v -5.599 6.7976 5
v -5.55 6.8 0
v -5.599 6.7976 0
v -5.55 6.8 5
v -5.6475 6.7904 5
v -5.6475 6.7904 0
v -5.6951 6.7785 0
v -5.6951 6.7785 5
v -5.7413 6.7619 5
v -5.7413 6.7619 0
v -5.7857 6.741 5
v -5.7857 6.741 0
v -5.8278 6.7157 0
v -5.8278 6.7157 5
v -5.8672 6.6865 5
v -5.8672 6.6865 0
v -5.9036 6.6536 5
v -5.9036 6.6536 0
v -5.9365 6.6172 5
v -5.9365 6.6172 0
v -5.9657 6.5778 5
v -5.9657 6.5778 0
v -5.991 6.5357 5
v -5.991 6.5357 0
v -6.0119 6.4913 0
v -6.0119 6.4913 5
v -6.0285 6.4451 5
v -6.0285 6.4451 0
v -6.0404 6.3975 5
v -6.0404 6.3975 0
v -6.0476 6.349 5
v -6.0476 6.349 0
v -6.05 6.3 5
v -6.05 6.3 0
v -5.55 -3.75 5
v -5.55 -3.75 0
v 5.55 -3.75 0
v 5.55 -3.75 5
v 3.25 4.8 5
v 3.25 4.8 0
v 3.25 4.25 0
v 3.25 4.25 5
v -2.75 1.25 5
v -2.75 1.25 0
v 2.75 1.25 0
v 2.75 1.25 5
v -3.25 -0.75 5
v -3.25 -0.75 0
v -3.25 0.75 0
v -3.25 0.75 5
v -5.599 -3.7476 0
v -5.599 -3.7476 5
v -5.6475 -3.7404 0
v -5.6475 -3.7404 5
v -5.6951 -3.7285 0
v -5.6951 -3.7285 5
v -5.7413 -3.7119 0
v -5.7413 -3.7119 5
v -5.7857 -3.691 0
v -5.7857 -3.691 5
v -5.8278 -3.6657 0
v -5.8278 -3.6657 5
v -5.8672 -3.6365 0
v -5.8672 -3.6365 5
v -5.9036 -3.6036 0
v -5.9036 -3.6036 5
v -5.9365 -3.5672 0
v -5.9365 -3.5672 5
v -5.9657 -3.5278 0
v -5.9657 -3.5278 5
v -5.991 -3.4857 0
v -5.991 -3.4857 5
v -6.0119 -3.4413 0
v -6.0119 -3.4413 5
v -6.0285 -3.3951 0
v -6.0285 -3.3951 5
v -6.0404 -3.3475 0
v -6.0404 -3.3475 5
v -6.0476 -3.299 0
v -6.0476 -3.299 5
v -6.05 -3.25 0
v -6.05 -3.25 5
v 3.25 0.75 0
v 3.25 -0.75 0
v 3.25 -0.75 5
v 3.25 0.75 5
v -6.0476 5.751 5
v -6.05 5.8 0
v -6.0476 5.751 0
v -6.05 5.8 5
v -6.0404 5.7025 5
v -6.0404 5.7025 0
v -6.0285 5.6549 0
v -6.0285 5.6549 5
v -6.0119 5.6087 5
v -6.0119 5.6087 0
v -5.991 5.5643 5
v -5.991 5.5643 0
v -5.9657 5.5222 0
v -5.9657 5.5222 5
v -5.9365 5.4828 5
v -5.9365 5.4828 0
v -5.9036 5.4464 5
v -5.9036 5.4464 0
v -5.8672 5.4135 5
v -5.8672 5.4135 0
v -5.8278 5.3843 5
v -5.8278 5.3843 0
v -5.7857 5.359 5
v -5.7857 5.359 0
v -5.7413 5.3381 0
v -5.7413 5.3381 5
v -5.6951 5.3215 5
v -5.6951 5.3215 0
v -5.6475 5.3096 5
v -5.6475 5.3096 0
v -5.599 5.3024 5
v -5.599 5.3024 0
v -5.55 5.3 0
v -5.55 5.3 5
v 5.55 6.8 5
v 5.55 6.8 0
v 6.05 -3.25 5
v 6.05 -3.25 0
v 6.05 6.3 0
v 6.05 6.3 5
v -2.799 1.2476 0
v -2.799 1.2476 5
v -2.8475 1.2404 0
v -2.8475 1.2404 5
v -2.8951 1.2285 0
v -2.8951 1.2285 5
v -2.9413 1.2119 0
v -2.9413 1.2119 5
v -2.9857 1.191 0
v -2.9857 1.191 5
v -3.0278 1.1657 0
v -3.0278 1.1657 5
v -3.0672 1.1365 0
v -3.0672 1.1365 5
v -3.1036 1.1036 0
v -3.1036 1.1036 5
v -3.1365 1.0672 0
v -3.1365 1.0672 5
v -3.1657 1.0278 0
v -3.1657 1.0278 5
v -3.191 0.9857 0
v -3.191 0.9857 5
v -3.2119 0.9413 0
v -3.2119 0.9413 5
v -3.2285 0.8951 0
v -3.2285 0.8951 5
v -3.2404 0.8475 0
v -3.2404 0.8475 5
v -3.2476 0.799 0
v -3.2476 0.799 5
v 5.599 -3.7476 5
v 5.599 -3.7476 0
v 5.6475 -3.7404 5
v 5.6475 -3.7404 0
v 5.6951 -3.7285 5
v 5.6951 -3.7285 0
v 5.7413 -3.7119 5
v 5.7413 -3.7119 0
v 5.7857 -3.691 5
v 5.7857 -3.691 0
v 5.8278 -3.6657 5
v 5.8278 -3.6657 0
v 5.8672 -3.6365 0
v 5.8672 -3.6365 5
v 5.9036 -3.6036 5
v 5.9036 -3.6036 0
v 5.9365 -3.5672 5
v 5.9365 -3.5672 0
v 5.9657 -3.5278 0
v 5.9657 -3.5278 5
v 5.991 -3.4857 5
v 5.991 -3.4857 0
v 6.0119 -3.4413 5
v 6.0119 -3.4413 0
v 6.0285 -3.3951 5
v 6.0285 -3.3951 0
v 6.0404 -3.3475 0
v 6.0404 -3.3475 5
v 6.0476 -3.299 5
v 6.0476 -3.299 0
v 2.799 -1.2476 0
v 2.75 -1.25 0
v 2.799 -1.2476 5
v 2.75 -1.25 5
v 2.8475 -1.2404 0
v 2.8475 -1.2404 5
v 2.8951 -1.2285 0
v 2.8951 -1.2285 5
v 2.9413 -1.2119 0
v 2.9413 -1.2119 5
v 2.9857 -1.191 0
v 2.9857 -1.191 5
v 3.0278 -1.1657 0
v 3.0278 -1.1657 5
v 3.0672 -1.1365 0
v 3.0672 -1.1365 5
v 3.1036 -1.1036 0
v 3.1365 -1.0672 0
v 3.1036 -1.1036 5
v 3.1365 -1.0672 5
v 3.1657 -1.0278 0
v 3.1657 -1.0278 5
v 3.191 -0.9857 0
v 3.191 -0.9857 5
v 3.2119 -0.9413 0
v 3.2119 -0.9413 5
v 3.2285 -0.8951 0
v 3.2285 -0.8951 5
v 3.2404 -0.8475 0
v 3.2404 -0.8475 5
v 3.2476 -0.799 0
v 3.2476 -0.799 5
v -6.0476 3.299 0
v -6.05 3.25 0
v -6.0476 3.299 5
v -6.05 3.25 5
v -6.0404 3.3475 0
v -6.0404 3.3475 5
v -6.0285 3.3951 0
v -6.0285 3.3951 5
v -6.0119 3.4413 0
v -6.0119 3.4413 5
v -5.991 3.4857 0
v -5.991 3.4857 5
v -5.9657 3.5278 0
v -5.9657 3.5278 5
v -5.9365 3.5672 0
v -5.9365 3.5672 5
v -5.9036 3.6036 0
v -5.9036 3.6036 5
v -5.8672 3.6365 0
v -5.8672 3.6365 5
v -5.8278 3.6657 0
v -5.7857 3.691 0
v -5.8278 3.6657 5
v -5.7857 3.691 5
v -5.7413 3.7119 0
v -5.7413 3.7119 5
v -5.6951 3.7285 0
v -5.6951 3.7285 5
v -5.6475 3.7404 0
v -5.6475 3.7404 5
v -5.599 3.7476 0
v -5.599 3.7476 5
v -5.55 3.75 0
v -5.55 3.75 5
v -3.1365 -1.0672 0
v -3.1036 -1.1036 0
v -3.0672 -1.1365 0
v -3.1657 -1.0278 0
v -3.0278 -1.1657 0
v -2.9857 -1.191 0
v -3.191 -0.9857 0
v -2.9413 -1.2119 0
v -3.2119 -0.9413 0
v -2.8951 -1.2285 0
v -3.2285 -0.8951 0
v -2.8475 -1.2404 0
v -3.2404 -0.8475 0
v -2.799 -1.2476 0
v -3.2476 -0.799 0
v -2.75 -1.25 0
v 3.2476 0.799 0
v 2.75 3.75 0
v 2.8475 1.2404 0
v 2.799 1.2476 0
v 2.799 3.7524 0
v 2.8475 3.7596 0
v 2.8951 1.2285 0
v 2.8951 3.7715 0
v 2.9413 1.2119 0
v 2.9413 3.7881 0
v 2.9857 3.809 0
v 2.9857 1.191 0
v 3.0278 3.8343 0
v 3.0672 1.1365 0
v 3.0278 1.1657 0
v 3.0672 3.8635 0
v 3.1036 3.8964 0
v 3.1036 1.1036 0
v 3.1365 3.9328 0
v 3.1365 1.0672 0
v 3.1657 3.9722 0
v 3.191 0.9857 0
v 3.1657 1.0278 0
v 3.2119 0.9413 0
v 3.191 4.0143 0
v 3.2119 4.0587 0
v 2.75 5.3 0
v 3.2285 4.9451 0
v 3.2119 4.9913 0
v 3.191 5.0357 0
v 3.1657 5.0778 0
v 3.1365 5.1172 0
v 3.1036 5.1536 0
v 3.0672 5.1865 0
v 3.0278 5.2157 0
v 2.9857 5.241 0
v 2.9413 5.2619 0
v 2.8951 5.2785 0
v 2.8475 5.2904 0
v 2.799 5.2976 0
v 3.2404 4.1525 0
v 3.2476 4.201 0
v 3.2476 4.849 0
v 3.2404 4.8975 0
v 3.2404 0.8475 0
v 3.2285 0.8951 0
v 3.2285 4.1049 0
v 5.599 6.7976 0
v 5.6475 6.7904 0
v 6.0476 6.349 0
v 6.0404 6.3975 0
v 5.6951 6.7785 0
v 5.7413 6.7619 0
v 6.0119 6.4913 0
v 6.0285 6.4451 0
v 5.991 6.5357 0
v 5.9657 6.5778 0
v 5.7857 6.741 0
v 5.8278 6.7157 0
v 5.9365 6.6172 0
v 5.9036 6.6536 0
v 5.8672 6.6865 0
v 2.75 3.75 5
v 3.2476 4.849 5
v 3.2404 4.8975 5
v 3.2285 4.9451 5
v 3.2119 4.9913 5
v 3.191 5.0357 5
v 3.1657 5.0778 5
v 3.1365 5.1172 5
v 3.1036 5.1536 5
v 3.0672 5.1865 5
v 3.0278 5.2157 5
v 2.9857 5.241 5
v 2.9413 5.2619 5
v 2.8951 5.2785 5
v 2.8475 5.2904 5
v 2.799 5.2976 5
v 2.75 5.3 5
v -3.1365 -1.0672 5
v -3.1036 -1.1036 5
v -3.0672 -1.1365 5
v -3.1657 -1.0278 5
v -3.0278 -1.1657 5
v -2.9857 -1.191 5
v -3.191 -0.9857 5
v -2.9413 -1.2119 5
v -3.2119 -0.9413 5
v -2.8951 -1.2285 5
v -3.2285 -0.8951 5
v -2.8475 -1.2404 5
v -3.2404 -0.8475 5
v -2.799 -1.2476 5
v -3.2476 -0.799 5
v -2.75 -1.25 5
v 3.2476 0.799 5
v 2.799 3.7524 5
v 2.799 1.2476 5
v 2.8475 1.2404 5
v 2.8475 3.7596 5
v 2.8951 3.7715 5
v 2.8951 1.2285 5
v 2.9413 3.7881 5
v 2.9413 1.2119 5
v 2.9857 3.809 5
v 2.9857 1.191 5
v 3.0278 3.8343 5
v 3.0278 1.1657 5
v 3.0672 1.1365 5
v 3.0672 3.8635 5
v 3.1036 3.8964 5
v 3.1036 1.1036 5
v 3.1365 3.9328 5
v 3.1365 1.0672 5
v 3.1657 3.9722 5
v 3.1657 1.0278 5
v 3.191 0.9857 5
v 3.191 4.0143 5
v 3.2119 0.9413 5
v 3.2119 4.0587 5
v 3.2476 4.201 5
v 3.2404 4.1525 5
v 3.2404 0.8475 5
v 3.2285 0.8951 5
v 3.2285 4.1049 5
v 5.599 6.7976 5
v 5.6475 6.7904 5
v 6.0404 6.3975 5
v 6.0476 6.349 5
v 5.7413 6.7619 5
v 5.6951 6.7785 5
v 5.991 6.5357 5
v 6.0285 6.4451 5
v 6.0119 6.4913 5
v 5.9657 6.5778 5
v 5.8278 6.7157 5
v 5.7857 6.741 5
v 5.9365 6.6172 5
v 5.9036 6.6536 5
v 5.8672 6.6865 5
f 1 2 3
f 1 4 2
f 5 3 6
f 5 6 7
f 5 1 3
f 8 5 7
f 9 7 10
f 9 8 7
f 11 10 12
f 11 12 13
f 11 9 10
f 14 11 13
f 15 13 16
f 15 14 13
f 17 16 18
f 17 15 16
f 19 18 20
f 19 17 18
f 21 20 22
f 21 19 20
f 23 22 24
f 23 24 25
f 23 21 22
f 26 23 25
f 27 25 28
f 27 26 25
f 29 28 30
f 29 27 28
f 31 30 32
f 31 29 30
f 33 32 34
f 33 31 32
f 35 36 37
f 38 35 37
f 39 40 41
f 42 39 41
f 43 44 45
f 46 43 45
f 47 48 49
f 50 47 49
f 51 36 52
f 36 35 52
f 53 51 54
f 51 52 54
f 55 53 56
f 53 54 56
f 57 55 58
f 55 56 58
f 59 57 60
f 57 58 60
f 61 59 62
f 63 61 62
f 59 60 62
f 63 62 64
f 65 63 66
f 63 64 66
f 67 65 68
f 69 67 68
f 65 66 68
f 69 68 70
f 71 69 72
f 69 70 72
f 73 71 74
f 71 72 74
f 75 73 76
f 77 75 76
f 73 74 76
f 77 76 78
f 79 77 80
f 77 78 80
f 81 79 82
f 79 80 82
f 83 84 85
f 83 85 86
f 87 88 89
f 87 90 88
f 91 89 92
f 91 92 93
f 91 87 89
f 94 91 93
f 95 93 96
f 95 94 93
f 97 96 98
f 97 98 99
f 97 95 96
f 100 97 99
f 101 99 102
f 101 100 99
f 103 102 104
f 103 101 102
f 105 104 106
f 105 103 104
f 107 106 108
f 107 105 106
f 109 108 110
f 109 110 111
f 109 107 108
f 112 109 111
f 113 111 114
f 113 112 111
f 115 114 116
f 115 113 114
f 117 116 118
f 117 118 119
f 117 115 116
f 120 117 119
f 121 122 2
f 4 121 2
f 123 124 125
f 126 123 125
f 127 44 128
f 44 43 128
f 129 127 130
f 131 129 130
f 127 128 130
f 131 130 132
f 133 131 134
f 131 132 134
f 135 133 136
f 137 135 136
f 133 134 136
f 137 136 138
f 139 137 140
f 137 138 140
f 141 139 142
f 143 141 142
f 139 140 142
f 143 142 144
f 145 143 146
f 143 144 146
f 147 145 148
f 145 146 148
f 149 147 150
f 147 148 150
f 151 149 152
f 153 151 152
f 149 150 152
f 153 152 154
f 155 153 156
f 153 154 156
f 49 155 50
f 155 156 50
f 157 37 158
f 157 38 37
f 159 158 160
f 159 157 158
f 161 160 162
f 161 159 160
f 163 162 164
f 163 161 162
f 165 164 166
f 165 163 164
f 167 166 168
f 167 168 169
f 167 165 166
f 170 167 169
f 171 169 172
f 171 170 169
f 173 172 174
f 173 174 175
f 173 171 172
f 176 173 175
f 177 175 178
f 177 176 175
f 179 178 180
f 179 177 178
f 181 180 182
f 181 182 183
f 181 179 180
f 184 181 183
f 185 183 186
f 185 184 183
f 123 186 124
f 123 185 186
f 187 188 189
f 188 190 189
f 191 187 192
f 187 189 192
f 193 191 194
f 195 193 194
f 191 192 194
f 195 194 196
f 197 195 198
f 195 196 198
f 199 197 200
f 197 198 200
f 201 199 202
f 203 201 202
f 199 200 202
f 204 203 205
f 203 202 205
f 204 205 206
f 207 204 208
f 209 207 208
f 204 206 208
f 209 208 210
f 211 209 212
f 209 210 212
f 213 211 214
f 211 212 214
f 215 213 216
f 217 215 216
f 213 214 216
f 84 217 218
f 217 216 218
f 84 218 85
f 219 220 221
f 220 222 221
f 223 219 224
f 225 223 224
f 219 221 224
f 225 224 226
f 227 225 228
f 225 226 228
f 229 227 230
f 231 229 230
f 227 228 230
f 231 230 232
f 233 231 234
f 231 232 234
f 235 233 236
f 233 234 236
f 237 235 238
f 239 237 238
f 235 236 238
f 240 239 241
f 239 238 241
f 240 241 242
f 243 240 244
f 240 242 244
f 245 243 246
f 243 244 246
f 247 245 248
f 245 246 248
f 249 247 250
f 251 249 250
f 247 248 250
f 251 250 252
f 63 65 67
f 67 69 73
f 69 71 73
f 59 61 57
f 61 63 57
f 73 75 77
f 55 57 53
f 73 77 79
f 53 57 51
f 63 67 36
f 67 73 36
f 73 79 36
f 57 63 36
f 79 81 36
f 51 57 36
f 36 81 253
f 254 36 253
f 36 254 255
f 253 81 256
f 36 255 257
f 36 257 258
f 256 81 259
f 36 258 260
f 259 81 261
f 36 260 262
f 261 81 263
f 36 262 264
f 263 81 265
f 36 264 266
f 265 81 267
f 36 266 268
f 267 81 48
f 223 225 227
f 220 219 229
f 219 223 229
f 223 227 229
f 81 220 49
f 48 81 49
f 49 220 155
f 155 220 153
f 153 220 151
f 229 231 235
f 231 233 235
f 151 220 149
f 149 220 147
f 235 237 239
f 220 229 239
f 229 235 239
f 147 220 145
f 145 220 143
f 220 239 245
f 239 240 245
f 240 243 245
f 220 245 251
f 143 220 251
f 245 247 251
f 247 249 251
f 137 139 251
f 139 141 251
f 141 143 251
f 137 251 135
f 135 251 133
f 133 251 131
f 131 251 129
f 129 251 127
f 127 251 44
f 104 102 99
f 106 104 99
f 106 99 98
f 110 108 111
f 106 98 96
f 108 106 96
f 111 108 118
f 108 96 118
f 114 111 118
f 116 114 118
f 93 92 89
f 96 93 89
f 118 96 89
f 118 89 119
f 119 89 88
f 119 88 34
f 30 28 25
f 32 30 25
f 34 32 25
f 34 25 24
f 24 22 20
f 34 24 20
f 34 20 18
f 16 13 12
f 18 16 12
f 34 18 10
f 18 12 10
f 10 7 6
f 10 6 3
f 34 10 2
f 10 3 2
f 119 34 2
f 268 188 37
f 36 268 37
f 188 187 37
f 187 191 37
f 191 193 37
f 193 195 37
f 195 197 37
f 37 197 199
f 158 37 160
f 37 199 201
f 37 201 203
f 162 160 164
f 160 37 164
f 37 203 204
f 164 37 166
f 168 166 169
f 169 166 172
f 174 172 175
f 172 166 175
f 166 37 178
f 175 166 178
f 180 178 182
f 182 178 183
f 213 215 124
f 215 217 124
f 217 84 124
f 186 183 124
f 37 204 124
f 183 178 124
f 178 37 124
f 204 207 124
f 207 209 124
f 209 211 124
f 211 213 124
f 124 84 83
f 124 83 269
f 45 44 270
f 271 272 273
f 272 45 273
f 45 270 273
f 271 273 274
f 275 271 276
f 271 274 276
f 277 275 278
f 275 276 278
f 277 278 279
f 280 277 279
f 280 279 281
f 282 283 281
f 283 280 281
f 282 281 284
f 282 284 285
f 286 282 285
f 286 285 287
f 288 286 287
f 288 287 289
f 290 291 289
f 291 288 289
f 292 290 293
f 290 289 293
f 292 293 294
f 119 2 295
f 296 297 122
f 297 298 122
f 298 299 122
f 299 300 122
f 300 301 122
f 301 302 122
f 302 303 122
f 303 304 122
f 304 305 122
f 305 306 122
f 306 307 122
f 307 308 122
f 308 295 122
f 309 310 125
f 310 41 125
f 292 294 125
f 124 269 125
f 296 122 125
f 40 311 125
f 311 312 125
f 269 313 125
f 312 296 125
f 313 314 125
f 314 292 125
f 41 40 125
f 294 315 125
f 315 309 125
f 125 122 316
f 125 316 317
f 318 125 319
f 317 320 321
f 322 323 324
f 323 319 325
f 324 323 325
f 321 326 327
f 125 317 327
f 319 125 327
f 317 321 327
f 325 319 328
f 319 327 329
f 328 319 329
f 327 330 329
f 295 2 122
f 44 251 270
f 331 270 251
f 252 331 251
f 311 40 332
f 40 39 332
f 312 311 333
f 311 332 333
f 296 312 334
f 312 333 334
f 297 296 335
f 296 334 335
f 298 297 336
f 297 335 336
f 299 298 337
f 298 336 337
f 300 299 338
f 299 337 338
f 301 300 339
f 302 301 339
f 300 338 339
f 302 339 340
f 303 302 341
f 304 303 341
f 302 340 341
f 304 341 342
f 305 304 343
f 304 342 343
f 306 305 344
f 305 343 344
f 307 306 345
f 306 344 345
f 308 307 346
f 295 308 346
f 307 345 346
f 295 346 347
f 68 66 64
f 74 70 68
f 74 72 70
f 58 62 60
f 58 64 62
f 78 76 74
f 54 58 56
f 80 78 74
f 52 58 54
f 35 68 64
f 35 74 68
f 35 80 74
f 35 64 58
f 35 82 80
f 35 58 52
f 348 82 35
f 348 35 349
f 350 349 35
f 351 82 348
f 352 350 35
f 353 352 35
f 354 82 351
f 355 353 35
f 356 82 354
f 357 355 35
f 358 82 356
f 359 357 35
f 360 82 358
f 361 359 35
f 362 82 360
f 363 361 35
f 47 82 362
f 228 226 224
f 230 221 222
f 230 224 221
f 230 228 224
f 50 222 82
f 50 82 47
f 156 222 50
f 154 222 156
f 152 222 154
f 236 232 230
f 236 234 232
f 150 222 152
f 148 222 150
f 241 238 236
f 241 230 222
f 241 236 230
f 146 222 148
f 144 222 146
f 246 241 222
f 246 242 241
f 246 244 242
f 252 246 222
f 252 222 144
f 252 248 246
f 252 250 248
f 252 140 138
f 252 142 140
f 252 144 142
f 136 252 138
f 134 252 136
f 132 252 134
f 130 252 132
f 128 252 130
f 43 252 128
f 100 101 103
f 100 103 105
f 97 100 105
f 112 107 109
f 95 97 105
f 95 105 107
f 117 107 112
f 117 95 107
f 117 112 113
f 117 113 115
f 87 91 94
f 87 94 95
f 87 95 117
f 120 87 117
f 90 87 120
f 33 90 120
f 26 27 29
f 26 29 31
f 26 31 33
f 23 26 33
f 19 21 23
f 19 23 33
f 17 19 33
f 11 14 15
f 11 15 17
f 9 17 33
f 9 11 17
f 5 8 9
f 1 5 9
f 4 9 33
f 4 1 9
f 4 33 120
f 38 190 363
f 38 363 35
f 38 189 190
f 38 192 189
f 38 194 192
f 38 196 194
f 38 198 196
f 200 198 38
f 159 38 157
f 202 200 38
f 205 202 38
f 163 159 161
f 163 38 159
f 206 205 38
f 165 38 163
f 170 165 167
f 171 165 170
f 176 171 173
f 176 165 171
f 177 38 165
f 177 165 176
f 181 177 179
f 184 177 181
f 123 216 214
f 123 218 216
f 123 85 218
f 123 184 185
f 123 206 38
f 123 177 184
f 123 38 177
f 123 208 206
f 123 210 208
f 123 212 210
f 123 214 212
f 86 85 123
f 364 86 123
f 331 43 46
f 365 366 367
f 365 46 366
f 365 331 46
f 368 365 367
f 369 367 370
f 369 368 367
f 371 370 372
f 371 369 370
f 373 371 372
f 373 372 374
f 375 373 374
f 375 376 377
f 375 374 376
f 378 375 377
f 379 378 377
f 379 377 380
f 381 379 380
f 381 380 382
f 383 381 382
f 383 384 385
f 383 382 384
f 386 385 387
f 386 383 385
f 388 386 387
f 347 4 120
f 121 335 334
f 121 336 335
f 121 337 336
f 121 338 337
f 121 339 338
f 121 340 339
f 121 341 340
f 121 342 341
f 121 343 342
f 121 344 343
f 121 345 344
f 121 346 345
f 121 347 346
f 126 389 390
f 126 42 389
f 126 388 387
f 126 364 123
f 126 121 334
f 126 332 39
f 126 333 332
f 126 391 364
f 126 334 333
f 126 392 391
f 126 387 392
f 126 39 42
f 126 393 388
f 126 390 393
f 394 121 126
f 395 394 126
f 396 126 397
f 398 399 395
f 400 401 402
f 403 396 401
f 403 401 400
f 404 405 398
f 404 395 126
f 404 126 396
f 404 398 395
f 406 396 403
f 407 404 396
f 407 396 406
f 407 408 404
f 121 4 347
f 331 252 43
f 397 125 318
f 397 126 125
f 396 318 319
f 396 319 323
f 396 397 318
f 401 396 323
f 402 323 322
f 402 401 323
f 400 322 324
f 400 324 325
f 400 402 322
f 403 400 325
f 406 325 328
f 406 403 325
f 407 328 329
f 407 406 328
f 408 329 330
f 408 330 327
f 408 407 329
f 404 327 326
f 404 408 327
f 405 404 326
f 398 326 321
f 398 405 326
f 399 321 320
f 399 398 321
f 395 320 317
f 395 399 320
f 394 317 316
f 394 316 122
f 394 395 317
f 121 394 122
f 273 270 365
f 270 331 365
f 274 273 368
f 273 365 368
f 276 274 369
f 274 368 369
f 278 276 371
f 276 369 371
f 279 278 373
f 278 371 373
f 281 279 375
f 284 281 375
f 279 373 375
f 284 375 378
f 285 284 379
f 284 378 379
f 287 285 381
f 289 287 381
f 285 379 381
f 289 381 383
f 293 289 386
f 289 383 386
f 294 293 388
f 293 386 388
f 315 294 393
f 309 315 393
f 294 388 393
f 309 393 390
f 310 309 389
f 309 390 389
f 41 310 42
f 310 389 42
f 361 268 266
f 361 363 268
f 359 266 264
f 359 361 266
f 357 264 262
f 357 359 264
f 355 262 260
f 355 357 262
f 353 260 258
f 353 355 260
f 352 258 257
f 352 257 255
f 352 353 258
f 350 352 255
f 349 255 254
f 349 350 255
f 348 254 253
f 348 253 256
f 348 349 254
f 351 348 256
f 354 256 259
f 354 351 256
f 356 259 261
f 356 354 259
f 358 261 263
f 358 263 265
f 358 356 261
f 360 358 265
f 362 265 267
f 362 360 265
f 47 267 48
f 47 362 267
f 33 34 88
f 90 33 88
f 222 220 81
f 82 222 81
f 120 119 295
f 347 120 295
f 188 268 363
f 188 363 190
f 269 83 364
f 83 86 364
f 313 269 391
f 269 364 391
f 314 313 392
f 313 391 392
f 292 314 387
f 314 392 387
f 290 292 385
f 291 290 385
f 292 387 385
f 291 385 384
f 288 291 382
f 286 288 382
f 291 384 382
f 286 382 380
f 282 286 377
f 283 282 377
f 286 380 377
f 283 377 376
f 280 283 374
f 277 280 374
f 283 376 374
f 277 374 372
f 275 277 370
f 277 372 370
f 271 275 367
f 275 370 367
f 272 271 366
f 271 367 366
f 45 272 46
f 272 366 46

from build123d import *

# Parameters (mm, degrees)
SKETCH1_W           = 6.5
SKETCH1_H           = 2.5
BOSS_EXTRUDE1_DEPTH = 5
FILLET1_R           = 0.5


with BuildPart() as part:
    # Sketch1 → Boss-Extrude1 (new body)
    with BuildSketch(Plane.XY):
        Polygon((-6.05, -3.75), (6.05, -3.75), (6.05, 6.8), (-6.05, 6.8), (-6.05, 5.3), (3.25, 5.3), (3.25, 3.75), (-6.05, 3.75), align=None)
        Rectangle(SKETCH1_W, SKETCH1_H, mode=Mode.SUBTRACT)
    extrude(amount=BOSS_EXTRUDE1_DEPTH)

    # Fillet1
    fillet1_edges = [part.edges().sort_by_distance(p)[0] for p in [
        (-6.05, 3.75, 2.5),
        (3.25, 3.75, 2.5),
        (3.25, 5.3, 2.5),
        (-6.05, 5.3, 2.5),
        (-6.05, 6.8, 2.5),
        (6.05, 6.8, 2.5),
        (6.05, -3.75, 2.5),
        (-6.05, -3.75, 2.5),
        (-3.25, 1.25, 2.5),
        (-3.25, -1.25, 2.5),
        (3.25, -1.25, 2.5),
        (3.25, 1.25, 2.5),
    ]]
    fillet(fillet1_edges, radius=FILLET1_R)


solid = part.part
